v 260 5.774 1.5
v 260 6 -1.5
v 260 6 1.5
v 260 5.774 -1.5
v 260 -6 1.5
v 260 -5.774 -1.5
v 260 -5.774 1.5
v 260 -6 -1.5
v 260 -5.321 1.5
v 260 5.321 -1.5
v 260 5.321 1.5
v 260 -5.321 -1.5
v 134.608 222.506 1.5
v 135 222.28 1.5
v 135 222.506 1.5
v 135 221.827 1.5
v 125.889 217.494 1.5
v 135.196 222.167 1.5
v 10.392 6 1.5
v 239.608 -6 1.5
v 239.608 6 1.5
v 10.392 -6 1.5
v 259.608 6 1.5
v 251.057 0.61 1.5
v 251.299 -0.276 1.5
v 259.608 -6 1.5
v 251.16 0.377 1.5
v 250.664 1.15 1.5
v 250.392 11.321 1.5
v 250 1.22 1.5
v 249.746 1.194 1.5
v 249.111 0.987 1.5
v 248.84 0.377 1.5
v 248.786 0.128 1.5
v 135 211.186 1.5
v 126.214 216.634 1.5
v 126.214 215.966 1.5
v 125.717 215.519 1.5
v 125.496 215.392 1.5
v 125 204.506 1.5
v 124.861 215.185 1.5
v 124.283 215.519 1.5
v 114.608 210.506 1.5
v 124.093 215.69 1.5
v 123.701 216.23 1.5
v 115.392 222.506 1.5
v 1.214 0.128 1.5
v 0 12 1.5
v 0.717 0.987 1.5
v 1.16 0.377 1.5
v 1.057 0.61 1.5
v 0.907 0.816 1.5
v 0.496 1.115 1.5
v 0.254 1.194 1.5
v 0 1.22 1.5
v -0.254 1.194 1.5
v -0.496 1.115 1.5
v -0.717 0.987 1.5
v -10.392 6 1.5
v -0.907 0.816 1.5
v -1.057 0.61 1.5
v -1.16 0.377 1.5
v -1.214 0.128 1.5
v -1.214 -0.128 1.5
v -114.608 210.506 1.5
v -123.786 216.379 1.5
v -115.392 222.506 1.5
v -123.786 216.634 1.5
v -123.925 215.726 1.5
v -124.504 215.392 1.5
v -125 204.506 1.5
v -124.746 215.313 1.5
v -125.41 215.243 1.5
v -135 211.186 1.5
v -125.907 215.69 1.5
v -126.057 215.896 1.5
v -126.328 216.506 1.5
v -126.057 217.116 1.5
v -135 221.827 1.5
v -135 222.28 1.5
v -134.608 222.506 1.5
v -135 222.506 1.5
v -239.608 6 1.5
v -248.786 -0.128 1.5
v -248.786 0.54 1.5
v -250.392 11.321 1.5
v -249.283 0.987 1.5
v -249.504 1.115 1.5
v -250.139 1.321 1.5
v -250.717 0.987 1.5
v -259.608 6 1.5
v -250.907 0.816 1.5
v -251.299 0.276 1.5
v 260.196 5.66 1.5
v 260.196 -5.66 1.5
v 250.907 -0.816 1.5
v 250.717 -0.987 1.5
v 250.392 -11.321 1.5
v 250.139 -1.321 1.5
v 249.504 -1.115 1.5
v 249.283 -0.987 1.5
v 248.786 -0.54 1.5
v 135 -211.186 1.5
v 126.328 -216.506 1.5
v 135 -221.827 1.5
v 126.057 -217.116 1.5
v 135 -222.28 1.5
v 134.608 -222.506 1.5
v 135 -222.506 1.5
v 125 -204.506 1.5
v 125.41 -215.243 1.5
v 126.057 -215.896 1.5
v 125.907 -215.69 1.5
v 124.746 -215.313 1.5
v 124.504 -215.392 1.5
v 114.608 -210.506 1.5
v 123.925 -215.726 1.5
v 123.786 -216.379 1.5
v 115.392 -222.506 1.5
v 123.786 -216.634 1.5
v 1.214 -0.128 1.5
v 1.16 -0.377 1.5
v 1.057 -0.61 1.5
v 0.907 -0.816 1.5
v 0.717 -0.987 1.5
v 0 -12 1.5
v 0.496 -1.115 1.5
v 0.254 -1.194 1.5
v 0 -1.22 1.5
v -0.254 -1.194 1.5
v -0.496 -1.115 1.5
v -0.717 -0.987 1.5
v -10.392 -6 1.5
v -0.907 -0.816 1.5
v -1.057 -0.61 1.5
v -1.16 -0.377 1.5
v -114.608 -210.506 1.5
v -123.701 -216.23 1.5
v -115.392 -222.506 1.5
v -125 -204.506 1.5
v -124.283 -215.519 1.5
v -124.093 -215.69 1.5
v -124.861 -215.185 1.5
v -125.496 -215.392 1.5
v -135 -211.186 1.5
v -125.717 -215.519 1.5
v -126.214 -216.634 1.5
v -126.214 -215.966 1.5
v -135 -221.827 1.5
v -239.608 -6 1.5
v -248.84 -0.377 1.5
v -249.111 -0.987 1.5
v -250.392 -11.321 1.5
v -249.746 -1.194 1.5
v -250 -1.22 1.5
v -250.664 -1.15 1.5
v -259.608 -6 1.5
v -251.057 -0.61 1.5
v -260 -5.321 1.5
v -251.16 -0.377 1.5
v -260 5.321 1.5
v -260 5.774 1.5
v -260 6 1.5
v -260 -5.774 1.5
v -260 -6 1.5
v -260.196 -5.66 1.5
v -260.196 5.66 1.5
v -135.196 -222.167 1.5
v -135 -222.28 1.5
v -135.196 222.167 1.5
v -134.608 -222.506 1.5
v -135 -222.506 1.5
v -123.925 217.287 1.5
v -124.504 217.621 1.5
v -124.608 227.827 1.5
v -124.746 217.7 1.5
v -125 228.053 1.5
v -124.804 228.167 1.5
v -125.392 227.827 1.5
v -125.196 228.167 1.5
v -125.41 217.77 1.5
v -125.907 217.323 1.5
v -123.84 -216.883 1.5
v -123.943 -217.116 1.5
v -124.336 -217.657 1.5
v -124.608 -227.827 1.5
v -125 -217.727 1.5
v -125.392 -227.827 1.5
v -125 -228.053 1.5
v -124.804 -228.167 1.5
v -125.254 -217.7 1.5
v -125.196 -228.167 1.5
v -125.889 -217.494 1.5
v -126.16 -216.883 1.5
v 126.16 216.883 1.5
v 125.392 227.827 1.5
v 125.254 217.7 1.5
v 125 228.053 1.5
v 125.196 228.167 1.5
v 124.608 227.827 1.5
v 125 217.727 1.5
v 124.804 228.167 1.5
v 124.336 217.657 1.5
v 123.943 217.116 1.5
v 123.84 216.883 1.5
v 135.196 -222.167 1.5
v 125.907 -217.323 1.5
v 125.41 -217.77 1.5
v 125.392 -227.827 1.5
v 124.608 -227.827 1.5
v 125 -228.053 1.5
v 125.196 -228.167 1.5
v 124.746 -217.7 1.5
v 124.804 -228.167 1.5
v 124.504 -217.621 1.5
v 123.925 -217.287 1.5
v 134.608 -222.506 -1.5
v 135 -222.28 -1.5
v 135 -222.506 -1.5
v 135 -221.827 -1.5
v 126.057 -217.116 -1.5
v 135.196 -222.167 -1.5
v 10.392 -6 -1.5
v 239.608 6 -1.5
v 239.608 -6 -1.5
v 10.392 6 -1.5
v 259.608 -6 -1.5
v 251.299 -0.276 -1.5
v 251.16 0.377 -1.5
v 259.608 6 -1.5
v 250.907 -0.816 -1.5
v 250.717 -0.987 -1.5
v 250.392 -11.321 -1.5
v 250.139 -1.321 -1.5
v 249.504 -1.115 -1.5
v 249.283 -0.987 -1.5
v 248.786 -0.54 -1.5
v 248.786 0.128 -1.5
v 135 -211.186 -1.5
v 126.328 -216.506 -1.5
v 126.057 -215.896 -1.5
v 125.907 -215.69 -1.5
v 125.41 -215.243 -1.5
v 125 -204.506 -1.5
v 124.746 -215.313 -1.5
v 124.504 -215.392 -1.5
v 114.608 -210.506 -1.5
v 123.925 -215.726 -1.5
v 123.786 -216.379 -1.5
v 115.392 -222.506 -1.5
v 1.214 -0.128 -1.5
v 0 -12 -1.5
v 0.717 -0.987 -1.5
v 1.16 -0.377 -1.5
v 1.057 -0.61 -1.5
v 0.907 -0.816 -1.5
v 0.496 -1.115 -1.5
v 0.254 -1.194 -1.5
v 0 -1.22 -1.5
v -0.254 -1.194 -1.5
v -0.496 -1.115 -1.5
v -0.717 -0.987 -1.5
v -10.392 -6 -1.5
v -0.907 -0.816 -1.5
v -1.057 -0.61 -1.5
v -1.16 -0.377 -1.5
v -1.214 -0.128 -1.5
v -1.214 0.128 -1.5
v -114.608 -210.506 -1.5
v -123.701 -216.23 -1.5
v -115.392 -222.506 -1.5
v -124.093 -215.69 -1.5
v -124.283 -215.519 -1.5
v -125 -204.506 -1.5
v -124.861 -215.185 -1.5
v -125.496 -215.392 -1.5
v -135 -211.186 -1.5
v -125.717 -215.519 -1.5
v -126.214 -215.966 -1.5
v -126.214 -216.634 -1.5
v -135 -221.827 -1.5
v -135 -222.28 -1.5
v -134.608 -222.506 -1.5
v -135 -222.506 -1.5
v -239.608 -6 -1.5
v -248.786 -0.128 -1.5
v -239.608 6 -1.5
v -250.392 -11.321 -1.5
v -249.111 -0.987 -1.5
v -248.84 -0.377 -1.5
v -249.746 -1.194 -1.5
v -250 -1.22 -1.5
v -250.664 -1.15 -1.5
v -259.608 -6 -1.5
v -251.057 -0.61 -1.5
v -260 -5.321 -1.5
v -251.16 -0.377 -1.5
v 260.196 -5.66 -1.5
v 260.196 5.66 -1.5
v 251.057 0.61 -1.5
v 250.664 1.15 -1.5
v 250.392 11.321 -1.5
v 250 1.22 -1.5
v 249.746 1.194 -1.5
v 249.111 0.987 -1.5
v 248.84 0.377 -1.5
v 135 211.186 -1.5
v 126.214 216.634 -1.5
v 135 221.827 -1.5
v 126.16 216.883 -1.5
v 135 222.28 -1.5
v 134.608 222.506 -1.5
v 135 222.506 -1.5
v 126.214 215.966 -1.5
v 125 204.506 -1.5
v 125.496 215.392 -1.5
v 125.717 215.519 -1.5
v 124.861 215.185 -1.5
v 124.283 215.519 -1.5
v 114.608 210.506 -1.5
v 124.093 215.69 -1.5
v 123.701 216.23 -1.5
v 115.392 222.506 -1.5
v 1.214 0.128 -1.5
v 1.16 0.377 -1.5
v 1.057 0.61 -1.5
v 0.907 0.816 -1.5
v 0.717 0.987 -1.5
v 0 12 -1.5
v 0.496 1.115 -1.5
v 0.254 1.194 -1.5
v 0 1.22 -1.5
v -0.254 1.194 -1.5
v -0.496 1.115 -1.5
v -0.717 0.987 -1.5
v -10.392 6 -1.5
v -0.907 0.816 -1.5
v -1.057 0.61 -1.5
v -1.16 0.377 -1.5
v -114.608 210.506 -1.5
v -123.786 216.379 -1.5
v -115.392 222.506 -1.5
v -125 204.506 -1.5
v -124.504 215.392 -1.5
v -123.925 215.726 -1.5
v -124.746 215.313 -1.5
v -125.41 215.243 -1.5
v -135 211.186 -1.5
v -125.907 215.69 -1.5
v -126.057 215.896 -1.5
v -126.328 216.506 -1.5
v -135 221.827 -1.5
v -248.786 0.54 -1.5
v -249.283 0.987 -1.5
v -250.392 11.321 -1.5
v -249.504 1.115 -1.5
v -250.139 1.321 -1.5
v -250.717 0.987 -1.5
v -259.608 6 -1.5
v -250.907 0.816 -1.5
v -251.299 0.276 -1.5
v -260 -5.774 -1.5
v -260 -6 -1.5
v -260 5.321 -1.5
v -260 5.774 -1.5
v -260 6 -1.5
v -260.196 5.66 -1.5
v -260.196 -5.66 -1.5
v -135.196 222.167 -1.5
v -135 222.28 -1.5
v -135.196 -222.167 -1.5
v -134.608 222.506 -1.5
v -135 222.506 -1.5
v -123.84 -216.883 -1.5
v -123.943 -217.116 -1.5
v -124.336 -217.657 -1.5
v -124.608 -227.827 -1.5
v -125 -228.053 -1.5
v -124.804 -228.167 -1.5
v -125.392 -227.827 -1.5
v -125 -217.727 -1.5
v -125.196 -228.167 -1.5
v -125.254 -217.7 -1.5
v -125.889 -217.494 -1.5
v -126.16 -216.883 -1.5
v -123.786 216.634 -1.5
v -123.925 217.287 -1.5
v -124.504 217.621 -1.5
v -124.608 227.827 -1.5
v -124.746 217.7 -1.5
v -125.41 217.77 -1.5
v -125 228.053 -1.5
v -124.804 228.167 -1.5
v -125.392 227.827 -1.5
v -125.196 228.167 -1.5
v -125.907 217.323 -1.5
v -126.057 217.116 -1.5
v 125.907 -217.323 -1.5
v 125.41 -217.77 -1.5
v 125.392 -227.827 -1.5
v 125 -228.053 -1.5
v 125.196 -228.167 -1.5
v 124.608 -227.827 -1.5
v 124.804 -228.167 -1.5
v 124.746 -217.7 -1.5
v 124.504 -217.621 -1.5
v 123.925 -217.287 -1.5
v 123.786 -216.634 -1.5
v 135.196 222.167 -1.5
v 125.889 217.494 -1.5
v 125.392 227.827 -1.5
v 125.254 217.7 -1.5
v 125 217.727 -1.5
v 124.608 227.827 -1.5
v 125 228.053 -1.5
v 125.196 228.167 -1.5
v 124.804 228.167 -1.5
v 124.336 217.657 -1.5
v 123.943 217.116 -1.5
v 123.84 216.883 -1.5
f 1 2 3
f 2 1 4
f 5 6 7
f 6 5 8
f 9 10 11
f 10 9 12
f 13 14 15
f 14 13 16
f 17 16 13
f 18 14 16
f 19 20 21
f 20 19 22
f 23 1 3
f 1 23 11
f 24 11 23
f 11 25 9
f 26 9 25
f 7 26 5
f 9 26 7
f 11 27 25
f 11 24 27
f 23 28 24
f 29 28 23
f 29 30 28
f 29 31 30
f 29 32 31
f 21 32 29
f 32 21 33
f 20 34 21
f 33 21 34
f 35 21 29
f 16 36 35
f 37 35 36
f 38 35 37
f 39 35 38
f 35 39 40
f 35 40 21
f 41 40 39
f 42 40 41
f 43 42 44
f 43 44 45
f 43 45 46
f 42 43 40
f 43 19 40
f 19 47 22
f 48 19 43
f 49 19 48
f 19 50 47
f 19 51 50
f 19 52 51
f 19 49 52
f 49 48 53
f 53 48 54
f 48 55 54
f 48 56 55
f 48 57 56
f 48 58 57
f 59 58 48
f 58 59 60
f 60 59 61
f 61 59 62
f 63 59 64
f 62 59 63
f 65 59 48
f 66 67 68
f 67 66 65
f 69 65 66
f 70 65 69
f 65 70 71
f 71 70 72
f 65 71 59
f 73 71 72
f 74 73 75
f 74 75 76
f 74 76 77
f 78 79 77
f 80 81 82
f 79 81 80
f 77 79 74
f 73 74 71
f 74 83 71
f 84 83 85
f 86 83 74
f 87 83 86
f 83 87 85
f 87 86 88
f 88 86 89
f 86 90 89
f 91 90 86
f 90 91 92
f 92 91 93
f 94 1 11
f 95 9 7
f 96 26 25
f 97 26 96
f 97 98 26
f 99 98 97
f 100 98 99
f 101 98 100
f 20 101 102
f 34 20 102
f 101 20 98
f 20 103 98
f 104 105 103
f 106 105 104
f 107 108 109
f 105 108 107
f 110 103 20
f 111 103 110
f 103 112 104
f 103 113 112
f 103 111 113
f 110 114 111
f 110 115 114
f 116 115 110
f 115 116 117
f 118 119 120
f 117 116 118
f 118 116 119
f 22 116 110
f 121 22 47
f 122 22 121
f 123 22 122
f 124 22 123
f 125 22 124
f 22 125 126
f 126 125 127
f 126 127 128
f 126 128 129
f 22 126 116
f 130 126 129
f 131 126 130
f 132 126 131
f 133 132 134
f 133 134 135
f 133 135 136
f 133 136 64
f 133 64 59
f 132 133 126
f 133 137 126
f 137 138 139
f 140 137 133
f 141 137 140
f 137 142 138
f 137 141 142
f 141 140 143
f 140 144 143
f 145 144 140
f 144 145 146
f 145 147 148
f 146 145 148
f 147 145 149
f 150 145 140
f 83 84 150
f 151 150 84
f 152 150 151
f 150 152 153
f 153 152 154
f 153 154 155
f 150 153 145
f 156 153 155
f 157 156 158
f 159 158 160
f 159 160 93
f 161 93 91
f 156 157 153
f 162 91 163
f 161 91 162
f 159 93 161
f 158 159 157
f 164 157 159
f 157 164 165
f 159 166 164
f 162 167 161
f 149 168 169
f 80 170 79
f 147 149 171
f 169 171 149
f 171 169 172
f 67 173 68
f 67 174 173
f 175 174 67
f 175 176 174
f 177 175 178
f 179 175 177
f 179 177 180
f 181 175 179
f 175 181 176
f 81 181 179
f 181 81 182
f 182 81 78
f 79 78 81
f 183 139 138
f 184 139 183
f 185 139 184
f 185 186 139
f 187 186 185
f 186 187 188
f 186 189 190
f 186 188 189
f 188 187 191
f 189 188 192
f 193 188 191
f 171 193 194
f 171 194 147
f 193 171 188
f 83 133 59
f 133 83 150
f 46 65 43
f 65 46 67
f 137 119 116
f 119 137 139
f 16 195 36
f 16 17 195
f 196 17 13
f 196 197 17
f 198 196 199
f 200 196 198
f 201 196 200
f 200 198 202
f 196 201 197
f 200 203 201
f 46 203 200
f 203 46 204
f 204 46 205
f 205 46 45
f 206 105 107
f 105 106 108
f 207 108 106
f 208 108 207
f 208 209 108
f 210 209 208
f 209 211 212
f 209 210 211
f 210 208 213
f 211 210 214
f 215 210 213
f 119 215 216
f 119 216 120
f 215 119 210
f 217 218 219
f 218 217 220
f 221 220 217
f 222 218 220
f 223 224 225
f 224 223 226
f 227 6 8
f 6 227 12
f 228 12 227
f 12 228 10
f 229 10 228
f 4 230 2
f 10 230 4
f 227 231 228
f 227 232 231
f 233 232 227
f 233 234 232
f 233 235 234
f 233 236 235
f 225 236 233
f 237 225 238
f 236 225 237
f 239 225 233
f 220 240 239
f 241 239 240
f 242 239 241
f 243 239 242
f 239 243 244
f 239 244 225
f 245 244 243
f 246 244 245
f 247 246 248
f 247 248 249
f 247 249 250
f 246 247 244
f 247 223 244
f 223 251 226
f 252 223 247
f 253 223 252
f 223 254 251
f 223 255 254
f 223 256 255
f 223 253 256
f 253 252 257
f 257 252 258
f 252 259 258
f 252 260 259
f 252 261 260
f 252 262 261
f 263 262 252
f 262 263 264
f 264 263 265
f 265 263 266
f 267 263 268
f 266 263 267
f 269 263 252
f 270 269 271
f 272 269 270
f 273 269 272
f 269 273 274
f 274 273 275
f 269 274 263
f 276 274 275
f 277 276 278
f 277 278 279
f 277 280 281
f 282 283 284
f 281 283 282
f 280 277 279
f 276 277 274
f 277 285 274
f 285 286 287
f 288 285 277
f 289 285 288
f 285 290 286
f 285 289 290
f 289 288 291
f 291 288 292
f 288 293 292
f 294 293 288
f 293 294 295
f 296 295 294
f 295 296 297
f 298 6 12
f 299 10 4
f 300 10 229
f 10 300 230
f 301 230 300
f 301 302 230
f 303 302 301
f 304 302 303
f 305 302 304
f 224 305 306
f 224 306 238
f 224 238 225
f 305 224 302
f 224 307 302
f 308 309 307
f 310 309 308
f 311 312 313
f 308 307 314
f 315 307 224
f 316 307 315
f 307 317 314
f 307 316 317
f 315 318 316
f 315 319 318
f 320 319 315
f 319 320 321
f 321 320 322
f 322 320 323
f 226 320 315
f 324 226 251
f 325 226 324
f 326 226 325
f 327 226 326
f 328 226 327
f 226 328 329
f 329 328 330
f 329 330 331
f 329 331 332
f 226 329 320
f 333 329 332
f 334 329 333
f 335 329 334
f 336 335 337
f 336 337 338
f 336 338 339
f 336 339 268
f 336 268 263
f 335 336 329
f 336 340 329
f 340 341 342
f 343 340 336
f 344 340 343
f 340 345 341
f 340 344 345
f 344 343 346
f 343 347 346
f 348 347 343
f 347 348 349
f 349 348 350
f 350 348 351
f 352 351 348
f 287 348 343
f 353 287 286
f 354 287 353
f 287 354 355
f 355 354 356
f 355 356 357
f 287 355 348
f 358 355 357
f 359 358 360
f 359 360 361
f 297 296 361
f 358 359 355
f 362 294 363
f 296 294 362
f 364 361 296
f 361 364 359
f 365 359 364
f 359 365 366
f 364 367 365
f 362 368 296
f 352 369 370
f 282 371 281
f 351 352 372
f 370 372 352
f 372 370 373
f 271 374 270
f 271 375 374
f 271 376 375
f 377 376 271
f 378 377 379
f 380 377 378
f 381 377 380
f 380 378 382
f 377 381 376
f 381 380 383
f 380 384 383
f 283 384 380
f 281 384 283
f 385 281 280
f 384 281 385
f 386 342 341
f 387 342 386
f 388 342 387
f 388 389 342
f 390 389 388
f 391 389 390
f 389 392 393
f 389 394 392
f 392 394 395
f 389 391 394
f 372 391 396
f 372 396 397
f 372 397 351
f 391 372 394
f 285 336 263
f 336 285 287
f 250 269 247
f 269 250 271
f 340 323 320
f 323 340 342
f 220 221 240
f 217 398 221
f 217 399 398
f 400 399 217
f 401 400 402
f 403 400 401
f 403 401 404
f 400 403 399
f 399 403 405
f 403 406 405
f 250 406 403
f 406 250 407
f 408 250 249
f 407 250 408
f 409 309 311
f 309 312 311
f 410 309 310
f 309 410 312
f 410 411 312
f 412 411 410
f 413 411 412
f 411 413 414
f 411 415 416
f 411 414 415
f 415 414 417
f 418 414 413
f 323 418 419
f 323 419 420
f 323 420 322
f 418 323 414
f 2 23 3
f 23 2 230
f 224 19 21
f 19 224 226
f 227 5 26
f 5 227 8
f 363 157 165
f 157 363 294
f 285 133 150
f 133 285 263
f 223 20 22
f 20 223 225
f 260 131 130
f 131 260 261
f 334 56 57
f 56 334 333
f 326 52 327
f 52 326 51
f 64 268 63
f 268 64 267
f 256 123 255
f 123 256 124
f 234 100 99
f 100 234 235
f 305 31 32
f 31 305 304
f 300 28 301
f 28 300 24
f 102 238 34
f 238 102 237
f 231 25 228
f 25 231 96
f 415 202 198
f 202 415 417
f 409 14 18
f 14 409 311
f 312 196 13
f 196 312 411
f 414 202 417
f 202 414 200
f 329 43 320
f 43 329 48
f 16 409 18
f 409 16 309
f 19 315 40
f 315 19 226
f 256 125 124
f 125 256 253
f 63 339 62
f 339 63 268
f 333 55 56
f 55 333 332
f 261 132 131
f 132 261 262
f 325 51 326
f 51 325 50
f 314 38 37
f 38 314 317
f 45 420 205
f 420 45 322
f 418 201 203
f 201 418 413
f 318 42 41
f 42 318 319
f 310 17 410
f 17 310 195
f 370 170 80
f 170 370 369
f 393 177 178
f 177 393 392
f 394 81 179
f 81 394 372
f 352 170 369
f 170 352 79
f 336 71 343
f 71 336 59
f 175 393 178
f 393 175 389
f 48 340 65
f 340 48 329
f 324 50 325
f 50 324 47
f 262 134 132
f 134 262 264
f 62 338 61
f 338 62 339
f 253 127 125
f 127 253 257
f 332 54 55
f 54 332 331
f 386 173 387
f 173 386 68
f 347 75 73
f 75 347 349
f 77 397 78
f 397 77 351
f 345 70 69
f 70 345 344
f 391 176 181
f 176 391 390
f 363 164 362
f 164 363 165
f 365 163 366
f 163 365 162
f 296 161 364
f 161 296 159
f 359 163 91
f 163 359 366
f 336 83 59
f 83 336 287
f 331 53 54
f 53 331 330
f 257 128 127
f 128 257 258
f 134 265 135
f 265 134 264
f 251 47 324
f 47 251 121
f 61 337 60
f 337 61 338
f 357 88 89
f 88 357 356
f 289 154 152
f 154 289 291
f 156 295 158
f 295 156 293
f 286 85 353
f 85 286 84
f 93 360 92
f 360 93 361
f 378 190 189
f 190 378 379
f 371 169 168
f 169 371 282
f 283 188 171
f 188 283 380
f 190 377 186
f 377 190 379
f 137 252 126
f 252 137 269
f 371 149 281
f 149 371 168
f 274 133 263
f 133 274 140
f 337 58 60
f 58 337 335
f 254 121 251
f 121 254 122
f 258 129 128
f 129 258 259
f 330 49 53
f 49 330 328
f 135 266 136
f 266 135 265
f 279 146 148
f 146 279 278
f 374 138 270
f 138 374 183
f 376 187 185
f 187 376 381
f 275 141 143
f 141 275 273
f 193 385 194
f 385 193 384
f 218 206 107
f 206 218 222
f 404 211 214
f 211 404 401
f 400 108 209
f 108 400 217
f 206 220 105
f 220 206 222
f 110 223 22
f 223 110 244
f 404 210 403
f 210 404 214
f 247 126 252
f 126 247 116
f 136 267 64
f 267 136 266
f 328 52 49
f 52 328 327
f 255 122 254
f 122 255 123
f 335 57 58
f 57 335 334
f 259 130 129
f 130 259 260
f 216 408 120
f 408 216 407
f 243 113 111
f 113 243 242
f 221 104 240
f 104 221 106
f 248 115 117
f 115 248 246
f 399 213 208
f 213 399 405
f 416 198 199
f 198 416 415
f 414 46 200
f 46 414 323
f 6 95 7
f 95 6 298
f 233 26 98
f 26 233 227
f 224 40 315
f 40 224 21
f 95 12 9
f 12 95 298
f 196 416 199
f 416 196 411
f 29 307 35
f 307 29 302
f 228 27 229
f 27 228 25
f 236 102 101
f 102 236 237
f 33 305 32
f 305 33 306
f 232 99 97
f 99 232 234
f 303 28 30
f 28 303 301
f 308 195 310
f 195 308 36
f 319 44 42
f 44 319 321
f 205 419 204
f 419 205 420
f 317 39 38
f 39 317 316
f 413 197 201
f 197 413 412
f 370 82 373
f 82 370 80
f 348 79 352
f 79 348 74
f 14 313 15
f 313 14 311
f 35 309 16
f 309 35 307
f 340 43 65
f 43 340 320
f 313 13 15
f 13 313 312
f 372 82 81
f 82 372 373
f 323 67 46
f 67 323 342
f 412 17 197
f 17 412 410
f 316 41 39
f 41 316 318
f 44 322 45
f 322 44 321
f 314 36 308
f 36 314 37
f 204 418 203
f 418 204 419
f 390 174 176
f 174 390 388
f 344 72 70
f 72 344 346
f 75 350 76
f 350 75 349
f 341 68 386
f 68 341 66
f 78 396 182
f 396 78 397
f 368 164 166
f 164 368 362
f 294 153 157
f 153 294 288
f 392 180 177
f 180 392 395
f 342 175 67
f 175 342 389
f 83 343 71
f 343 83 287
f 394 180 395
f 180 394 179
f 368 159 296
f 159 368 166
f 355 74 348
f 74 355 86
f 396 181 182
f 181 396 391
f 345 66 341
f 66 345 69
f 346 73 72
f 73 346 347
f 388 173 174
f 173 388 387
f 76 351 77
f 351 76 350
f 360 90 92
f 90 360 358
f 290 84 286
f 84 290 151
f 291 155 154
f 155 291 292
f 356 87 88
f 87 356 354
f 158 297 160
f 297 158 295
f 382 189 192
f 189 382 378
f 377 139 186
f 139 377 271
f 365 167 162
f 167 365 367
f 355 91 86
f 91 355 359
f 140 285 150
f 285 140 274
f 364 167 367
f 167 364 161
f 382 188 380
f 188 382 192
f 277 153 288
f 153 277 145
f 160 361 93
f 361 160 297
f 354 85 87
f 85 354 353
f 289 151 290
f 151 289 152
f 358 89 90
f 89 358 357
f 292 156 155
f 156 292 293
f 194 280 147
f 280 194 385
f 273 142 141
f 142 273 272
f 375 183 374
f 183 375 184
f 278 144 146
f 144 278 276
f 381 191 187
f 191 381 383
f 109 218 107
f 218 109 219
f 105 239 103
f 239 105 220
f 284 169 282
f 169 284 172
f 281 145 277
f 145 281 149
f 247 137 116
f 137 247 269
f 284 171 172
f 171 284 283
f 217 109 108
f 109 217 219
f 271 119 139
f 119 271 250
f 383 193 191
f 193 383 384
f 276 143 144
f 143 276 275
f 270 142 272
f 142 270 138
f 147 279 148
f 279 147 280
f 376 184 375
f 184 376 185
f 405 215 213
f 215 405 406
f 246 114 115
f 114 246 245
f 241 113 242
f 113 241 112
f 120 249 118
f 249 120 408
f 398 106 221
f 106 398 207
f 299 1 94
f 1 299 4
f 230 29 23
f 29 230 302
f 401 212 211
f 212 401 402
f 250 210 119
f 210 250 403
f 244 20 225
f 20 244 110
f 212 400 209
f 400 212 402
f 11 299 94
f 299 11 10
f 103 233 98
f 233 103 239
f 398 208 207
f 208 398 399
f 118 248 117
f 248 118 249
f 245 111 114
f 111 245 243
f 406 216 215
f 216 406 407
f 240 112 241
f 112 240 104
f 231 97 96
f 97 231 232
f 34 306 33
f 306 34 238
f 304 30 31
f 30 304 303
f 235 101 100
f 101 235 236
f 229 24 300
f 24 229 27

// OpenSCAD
l = 250;
u=10;


/*
Mini-kossel

Vertical 600
horizontal 240 + some makes 300
GT2 timing belt x 4m and 3 x GT2-20T timing pulleys

max radius = cos(theta) * arm with typical theta of 20degrees min

     Zero backlash.
    Type: Delta printer
    Speed: 320 mm/s in all 3 directions.
    Resolution: 100 steps/mm in all 3 directions.
    Repeatability: better than 0.03 mm (30 micron)
    Build volume: cylindrical, 170mm diameter, 240mm height.
    Footprint: triangle, 300 mm width (240mm OpenBeam + printed corners).
    Frame height: 600 mm.
    Print surface: unheated round glass, doesn't move.
    Mass of end effector with hotend: less than 50 grams.
    Simplicity: fewer than 200 parts.
    Hardware cost: less than $600 USD.
    Fully automatic print surface level calibration (autoleveling). 

    carbon tube 180 + traxxas bearings

Optionally scale down to a Traveling RepRap that fits within IATA hand luggage size limit (see transportation):

    Frame height: 550 mm.
    Footprint: triangle, 270 mm width, 250 mm across (210mm 15 x 15 mm aluminum extrusion like OpenBeam + printed corners). 

*/

module bar() {
    difference(){
    translate([l/2,0,0])cube([l+u+u,12,3],center=true);
    translate([0,0,0]) cylinder(d=3,h=50,center=true);
    translate([l,0,0]) cylinder(d=3,h=50,center=true);
    }
}

bar();

for (i=[0:60:359]){
    rotate([0,0,i])bar();
}

for(i=[0:60:359]){
    rotate([0,0,i])translate([l,0,0])
       rotate([0,0,120])bar();
}

square(sqrt(3)*(l),center=true);
